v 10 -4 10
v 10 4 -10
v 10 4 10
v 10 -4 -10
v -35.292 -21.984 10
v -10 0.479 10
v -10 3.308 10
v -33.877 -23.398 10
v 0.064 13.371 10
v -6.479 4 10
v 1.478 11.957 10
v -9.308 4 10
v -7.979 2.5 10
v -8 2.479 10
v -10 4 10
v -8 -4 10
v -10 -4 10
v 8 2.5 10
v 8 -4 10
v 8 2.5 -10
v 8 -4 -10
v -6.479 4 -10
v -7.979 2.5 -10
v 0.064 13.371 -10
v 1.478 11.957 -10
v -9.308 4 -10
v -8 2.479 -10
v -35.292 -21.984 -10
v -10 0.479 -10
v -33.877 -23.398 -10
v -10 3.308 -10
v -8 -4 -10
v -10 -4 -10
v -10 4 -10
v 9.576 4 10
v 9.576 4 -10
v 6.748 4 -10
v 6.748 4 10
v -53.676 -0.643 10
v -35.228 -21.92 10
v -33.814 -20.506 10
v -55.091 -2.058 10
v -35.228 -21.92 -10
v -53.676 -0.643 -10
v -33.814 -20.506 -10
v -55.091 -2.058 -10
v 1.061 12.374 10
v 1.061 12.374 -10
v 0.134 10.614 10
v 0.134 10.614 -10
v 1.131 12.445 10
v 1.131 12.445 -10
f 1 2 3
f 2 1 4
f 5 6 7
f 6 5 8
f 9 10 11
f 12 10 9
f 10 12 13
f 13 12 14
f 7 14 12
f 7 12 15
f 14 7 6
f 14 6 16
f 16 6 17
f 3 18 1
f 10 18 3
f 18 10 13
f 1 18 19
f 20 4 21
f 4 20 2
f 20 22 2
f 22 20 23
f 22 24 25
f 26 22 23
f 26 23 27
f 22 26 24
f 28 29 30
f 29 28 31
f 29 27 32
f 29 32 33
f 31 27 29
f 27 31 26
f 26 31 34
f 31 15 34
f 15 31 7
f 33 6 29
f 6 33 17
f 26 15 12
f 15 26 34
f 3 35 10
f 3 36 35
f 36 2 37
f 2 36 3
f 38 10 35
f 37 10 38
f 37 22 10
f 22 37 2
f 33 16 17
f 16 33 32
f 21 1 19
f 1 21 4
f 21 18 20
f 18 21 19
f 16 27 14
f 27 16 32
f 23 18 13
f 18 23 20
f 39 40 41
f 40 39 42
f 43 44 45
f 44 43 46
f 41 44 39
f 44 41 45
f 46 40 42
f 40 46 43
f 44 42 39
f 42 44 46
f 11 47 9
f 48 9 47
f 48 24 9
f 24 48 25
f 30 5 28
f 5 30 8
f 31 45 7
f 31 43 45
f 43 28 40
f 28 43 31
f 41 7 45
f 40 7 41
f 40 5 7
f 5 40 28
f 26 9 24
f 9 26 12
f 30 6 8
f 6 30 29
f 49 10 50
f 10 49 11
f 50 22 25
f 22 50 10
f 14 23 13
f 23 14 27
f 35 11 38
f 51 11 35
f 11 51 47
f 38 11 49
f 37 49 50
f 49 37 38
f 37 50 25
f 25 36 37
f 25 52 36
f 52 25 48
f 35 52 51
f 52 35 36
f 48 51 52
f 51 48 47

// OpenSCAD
    union() {
        union() {
            difference(){
                color("blue") cube ([20, 8, 20], center=true);
                color("red") translate ([0, -1, 0]) cube ([16, 7, 200], center=true);
            }
        }

        color("yellow")
            rotate(a=135)
                translate([7.5, 38.41, -10]) difference() {
                    cube ([30, 2, 20]);
                }

        color("pink")
            rotate(a=45)
                translate([-40.5, 7.41, -10]) difference() {
                    cube ([50, 2, 20]);
                }

        color("orange") 
            rotate(a=135) 
                translate([-4, -9.6, -10]) 
                    cube ([12, 2, 20]);
    }
